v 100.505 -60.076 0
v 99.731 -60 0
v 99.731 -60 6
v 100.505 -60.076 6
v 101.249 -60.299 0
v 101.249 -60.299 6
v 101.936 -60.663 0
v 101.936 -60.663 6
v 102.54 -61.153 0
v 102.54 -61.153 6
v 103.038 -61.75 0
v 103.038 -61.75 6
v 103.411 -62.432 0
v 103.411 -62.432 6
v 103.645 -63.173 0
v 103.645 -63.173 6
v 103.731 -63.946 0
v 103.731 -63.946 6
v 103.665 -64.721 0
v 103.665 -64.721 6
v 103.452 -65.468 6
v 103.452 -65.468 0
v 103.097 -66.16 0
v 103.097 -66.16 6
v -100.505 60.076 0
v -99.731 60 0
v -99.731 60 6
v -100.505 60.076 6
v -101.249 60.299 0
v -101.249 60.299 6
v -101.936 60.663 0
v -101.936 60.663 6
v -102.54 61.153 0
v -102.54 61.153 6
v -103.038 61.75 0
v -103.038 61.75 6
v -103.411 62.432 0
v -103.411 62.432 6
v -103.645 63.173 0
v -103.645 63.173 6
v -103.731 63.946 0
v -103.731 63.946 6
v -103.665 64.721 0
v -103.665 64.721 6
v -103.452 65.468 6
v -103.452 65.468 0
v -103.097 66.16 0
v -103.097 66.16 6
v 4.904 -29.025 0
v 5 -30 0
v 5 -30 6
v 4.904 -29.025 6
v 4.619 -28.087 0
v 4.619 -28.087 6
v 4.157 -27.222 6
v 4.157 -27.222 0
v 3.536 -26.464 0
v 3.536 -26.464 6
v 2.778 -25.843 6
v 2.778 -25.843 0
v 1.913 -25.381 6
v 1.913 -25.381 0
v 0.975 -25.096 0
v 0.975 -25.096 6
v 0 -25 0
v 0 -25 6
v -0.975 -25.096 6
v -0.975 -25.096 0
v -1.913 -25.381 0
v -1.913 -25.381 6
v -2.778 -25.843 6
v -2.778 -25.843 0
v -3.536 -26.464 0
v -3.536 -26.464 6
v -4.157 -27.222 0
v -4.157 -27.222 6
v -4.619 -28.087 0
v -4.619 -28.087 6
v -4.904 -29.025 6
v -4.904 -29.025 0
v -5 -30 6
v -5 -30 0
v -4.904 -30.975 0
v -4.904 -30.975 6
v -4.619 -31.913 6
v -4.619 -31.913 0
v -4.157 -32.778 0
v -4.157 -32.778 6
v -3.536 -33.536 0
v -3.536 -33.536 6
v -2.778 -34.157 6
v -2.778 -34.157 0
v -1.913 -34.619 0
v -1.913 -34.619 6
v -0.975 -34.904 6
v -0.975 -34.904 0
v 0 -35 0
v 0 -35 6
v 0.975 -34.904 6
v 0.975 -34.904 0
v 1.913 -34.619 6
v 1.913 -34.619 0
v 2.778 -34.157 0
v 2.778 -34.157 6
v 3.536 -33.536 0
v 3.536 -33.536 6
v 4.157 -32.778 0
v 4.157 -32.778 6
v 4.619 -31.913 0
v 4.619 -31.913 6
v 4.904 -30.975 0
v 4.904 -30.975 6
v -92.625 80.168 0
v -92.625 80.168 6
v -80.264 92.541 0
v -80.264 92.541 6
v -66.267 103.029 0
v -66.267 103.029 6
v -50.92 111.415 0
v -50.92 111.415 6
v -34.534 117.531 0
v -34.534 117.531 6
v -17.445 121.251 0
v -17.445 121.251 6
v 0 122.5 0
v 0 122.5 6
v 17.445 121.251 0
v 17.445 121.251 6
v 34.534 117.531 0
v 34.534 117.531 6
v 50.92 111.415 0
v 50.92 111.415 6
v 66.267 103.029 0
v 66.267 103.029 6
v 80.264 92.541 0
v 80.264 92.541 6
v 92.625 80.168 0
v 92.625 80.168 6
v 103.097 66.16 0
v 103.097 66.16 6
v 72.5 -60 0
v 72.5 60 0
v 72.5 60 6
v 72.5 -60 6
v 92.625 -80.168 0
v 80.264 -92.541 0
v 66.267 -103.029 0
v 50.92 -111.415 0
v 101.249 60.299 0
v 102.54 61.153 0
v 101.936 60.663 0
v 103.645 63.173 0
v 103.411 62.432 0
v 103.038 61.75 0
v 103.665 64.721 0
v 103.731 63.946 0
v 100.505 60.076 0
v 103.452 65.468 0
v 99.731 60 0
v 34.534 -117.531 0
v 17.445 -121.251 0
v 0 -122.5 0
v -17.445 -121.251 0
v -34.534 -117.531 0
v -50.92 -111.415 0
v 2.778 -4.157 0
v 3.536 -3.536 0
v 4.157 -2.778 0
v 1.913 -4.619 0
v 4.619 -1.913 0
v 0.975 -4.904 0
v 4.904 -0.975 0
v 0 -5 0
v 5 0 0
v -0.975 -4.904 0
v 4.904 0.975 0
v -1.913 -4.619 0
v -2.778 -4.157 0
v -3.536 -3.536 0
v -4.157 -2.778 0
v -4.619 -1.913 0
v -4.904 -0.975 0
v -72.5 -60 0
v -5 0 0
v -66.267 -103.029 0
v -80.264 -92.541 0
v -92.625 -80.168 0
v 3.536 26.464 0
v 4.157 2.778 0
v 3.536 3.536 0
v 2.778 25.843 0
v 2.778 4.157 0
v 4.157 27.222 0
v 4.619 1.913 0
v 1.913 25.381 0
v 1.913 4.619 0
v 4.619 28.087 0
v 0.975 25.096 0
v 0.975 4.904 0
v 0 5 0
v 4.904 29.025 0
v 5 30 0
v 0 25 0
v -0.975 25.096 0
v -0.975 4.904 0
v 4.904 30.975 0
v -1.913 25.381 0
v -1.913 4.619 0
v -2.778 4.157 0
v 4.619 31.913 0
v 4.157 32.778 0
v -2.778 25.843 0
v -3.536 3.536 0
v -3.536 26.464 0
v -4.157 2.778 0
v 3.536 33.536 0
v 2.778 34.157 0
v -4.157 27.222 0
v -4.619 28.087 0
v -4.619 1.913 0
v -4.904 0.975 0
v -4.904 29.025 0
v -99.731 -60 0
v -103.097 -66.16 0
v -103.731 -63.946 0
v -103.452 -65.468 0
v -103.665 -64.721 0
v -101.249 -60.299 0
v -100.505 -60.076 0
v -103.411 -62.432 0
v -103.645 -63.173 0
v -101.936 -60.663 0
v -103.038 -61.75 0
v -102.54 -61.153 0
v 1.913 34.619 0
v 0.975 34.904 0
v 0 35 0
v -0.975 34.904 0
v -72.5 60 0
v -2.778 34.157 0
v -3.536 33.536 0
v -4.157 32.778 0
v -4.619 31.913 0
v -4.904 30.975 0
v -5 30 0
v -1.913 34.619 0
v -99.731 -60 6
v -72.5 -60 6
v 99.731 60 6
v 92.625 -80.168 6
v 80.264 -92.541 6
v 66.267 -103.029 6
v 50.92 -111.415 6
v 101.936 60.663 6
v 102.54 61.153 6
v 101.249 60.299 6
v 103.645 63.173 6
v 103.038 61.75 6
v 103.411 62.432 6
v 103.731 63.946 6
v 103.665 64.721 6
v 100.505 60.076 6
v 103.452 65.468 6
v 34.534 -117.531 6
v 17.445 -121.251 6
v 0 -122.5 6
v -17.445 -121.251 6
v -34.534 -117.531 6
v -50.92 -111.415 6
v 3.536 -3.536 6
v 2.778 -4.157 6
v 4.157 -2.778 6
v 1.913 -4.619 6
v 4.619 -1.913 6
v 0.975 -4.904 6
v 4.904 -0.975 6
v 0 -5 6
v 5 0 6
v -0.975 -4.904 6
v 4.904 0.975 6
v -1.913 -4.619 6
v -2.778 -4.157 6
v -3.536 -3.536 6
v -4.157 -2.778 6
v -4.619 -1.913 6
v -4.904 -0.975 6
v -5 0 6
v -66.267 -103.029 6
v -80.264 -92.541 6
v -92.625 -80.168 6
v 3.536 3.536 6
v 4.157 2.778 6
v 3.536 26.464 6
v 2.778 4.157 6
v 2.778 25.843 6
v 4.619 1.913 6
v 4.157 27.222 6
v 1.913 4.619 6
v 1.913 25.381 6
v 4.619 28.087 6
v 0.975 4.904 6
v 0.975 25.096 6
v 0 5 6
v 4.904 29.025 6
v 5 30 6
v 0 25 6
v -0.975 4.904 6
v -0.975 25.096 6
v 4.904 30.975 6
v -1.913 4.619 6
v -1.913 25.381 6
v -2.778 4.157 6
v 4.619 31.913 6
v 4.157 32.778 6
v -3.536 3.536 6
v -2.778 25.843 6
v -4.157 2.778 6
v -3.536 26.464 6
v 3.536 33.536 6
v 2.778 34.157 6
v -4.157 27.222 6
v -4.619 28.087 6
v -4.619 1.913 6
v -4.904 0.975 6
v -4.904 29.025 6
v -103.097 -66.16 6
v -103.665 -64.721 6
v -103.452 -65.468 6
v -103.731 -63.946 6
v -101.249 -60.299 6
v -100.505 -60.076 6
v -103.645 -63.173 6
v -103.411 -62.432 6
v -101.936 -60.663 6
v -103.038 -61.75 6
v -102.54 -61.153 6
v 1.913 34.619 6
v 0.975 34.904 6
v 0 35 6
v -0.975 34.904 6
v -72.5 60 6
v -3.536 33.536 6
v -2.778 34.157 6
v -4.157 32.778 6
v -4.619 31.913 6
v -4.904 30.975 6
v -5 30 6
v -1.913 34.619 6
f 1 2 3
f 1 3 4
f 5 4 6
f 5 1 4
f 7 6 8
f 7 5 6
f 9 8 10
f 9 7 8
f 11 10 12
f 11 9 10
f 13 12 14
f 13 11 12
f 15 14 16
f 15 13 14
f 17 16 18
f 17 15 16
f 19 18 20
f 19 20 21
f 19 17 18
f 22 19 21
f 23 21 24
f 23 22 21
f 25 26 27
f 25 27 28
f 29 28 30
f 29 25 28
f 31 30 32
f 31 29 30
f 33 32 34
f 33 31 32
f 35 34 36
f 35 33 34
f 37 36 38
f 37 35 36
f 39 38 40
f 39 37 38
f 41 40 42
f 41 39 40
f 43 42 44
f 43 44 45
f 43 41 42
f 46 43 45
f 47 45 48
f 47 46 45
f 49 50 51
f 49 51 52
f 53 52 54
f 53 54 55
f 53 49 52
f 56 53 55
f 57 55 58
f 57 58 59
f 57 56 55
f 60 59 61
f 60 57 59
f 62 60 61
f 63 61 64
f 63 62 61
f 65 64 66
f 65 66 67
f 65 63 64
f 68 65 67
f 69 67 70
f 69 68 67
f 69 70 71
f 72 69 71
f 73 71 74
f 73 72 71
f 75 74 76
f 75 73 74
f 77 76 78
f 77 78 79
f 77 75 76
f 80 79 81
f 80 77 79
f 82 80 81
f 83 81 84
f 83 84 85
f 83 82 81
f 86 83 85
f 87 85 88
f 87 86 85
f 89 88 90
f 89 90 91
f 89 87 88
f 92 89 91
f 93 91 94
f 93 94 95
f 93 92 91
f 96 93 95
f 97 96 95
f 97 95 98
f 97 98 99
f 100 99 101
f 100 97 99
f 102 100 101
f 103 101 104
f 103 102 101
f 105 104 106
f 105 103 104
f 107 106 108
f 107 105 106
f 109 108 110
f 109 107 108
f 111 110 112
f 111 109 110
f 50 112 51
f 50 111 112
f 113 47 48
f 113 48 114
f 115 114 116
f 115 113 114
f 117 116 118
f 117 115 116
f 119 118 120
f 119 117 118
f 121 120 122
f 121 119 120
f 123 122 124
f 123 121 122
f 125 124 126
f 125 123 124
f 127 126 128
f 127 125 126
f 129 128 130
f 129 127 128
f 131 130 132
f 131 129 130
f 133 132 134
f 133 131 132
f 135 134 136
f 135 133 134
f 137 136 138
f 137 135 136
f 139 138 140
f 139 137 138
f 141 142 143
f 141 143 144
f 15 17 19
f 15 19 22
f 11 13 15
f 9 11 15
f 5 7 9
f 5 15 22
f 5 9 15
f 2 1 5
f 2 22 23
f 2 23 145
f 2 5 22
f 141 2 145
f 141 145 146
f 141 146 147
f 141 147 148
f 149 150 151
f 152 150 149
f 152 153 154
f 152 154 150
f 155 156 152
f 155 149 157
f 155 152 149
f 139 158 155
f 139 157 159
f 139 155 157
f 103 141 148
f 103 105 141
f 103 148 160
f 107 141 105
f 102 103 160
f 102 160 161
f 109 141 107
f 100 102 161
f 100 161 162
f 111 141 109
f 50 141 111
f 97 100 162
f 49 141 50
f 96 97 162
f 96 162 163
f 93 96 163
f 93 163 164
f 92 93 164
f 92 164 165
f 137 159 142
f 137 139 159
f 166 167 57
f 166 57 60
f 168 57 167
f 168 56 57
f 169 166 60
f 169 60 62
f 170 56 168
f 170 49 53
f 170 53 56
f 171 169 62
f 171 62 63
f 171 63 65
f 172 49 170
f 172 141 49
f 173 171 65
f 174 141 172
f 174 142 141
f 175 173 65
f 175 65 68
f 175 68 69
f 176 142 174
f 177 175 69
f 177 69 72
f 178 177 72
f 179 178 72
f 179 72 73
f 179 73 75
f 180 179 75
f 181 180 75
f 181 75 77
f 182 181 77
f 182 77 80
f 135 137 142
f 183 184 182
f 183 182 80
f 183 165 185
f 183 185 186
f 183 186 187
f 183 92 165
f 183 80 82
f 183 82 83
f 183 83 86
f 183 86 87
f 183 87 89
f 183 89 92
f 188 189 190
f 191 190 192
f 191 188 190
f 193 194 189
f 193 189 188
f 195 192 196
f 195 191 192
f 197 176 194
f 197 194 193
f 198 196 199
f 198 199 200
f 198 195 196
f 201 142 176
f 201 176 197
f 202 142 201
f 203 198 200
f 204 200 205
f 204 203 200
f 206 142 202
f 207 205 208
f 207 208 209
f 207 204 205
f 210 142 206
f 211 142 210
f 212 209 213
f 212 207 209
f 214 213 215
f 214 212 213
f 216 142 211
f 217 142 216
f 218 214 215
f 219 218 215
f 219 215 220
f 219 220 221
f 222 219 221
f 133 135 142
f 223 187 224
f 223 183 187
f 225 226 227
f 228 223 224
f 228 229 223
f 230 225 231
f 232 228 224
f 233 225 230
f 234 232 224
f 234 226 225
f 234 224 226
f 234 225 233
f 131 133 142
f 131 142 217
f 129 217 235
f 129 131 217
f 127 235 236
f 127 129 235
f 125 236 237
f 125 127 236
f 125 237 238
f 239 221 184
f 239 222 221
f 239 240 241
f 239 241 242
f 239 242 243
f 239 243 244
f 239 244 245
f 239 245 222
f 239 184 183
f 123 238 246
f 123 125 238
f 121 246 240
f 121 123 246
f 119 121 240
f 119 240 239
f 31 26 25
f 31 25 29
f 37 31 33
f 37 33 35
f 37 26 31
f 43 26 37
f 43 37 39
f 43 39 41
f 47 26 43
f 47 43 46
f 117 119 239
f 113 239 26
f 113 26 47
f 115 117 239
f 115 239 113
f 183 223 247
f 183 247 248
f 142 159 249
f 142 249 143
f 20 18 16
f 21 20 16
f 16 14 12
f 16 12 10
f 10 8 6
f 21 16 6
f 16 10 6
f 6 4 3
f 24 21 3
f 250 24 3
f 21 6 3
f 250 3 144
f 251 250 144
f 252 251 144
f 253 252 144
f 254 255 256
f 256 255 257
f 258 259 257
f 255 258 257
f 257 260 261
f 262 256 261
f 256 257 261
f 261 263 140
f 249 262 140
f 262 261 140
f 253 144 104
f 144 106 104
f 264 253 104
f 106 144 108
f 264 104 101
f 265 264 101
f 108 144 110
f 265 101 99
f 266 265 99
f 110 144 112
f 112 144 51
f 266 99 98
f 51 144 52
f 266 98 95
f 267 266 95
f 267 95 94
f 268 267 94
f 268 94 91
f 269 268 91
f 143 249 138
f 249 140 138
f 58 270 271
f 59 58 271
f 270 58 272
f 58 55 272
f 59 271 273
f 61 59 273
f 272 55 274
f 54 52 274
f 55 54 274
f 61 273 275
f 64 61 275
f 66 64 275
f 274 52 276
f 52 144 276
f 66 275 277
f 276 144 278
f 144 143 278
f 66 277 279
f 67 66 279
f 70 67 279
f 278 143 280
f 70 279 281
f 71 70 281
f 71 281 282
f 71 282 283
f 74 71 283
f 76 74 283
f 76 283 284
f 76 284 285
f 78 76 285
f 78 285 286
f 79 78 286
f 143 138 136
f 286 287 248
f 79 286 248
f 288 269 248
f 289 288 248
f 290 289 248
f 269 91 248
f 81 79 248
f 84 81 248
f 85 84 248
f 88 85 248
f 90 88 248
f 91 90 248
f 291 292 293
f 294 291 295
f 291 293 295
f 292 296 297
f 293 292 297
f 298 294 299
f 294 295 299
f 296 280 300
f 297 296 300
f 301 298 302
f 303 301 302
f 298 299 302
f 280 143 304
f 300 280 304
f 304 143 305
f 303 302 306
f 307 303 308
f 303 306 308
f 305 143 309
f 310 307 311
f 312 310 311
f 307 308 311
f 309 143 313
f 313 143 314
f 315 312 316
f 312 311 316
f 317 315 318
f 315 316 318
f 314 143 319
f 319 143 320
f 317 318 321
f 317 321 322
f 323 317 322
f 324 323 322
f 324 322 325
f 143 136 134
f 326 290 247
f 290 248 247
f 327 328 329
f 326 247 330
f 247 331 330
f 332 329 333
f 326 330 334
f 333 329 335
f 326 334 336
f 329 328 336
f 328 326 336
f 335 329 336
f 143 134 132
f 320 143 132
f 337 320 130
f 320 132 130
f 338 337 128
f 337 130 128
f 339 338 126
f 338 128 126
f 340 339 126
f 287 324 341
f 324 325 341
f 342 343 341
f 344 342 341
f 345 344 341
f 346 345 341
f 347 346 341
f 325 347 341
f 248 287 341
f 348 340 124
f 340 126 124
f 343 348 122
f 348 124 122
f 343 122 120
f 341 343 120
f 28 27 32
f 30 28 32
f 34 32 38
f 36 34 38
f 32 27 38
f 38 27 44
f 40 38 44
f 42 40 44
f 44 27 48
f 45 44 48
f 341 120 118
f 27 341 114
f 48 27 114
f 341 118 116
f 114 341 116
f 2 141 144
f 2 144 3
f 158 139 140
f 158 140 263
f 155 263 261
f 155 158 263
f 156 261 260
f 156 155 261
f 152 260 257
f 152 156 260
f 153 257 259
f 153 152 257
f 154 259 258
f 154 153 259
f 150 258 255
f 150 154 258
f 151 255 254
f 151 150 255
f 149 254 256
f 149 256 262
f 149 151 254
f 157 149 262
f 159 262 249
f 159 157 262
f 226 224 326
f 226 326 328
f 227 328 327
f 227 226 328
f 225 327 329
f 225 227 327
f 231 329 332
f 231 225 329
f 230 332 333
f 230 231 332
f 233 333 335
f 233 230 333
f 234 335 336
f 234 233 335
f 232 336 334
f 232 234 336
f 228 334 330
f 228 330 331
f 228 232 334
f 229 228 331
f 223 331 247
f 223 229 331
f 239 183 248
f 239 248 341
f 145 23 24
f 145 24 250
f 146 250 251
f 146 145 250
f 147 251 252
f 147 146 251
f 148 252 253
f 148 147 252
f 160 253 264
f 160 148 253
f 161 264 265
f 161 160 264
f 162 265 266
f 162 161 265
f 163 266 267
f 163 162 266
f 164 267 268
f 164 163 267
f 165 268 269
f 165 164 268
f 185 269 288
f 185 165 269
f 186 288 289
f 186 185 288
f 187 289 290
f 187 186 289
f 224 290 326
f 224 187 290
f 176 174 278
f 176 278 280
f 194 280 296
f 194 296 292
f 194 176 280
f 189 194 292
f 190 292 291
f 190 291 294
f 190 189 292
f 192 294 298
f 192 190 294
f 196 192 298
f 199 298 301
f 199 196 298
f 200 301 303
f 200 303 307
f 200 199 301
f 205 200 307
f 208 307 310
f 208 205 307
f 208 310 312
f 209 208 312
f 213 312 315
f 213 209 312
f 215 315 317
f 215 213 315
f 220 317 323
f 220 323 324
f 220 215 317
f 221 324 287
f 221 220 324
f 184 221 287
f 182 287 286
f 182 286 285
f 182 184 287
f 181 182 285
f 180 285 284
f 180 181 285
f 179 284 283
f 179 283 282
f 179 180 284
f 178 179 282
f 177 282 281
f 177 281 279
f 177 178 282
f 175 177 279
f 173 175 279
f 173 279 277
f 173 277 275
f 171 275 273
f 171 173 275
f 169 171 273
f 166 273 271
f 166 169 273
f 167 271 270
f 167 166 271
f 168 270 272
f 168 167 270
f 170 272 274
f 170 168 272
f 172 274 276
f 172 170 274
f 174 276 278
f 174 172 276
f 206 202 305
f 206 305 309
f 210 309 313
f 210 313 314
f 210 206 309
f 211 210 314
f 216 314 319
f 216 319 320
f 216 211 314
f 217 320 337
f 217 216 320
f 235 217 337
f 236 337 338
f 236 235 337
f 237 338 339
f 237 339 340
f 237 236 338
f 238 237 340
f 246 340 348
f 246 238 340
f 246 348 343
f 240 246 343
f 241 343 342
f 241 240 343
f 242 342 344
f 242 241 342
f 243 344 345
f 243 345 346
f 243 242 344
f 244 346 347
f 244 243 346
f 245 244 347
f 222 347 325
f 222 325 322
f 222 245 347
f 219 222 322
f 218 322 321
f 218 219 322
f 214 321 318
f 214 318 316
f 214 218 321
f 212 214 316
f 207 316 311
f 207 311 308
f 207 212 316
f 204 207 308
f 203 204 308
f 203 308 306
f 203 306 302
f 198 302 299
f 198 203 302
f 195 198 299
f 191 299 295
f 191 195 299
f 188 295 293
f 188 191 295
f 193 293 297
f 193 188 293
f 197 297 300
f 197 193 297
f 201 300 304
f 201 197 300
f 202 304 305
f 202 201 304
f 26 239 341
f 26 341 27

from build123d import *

# Parameters (mm, degrees)
ESBO_O1_R                = 5
RESSALTO_EXTRUS_O1_DEPTH = 6


with BuildPart() as part:
    # Esboço1 → Ressalto-extrusão1 (new body)
    with BuildSketch(Plane.XY):
        with BuildLine():
            Line((-72.5, 60), (-99.730887893, 60))
            ThreePointArc((-99.730887893, 60), (-103.240969816, 62.08184336), (-103.097331367, 66.160337553))
            ThreePointArc((-103.097331367, 66.160337553), (0, 122.5), (103.097331367, 66.160337553))
            ThreePointArc((103.097331367, 66.160337553), (103.240969816, 62.08184336), (99.730887893, 60))
            Line((99.730887893, 60), (72.5, 60))
            Line((72.5, 60), (72.5, -60))
            Line((72.5, -60), (99.730887893, -60))
            ThreePointArc((99.730887893, -60), (103.240969816, -62.08184336), (103.097331367, -66.160337553))
            ThreePointArc((103.097331367, -66.160337553), (0, -122.5), (-103.097331367, -66.160337553))
            ThreePointArc((-103.097331367, -66.160337553), (-103.240969816, -62.08184336), (-99.730887893, -60))
            Line((-99.730887893, -60), (-72.5, -60))
            Line((-72.5, -60), (-72.5, 60))
        make_face()
        with Locations((0, -30)):
            Circle(ESBO_O1_R, mode=Mode.SUBTRACT)
        Circle(ESBO_O1_R, mode=Mode.SUBTRACT)
        with Locations((0, 30)):
            Circle(ESBO_O1_R, mode=Mode.SUBTRACT)
    extrude(amount=RESSALTO_EXTRUS_O1_DEPTH)


solid = part.part
